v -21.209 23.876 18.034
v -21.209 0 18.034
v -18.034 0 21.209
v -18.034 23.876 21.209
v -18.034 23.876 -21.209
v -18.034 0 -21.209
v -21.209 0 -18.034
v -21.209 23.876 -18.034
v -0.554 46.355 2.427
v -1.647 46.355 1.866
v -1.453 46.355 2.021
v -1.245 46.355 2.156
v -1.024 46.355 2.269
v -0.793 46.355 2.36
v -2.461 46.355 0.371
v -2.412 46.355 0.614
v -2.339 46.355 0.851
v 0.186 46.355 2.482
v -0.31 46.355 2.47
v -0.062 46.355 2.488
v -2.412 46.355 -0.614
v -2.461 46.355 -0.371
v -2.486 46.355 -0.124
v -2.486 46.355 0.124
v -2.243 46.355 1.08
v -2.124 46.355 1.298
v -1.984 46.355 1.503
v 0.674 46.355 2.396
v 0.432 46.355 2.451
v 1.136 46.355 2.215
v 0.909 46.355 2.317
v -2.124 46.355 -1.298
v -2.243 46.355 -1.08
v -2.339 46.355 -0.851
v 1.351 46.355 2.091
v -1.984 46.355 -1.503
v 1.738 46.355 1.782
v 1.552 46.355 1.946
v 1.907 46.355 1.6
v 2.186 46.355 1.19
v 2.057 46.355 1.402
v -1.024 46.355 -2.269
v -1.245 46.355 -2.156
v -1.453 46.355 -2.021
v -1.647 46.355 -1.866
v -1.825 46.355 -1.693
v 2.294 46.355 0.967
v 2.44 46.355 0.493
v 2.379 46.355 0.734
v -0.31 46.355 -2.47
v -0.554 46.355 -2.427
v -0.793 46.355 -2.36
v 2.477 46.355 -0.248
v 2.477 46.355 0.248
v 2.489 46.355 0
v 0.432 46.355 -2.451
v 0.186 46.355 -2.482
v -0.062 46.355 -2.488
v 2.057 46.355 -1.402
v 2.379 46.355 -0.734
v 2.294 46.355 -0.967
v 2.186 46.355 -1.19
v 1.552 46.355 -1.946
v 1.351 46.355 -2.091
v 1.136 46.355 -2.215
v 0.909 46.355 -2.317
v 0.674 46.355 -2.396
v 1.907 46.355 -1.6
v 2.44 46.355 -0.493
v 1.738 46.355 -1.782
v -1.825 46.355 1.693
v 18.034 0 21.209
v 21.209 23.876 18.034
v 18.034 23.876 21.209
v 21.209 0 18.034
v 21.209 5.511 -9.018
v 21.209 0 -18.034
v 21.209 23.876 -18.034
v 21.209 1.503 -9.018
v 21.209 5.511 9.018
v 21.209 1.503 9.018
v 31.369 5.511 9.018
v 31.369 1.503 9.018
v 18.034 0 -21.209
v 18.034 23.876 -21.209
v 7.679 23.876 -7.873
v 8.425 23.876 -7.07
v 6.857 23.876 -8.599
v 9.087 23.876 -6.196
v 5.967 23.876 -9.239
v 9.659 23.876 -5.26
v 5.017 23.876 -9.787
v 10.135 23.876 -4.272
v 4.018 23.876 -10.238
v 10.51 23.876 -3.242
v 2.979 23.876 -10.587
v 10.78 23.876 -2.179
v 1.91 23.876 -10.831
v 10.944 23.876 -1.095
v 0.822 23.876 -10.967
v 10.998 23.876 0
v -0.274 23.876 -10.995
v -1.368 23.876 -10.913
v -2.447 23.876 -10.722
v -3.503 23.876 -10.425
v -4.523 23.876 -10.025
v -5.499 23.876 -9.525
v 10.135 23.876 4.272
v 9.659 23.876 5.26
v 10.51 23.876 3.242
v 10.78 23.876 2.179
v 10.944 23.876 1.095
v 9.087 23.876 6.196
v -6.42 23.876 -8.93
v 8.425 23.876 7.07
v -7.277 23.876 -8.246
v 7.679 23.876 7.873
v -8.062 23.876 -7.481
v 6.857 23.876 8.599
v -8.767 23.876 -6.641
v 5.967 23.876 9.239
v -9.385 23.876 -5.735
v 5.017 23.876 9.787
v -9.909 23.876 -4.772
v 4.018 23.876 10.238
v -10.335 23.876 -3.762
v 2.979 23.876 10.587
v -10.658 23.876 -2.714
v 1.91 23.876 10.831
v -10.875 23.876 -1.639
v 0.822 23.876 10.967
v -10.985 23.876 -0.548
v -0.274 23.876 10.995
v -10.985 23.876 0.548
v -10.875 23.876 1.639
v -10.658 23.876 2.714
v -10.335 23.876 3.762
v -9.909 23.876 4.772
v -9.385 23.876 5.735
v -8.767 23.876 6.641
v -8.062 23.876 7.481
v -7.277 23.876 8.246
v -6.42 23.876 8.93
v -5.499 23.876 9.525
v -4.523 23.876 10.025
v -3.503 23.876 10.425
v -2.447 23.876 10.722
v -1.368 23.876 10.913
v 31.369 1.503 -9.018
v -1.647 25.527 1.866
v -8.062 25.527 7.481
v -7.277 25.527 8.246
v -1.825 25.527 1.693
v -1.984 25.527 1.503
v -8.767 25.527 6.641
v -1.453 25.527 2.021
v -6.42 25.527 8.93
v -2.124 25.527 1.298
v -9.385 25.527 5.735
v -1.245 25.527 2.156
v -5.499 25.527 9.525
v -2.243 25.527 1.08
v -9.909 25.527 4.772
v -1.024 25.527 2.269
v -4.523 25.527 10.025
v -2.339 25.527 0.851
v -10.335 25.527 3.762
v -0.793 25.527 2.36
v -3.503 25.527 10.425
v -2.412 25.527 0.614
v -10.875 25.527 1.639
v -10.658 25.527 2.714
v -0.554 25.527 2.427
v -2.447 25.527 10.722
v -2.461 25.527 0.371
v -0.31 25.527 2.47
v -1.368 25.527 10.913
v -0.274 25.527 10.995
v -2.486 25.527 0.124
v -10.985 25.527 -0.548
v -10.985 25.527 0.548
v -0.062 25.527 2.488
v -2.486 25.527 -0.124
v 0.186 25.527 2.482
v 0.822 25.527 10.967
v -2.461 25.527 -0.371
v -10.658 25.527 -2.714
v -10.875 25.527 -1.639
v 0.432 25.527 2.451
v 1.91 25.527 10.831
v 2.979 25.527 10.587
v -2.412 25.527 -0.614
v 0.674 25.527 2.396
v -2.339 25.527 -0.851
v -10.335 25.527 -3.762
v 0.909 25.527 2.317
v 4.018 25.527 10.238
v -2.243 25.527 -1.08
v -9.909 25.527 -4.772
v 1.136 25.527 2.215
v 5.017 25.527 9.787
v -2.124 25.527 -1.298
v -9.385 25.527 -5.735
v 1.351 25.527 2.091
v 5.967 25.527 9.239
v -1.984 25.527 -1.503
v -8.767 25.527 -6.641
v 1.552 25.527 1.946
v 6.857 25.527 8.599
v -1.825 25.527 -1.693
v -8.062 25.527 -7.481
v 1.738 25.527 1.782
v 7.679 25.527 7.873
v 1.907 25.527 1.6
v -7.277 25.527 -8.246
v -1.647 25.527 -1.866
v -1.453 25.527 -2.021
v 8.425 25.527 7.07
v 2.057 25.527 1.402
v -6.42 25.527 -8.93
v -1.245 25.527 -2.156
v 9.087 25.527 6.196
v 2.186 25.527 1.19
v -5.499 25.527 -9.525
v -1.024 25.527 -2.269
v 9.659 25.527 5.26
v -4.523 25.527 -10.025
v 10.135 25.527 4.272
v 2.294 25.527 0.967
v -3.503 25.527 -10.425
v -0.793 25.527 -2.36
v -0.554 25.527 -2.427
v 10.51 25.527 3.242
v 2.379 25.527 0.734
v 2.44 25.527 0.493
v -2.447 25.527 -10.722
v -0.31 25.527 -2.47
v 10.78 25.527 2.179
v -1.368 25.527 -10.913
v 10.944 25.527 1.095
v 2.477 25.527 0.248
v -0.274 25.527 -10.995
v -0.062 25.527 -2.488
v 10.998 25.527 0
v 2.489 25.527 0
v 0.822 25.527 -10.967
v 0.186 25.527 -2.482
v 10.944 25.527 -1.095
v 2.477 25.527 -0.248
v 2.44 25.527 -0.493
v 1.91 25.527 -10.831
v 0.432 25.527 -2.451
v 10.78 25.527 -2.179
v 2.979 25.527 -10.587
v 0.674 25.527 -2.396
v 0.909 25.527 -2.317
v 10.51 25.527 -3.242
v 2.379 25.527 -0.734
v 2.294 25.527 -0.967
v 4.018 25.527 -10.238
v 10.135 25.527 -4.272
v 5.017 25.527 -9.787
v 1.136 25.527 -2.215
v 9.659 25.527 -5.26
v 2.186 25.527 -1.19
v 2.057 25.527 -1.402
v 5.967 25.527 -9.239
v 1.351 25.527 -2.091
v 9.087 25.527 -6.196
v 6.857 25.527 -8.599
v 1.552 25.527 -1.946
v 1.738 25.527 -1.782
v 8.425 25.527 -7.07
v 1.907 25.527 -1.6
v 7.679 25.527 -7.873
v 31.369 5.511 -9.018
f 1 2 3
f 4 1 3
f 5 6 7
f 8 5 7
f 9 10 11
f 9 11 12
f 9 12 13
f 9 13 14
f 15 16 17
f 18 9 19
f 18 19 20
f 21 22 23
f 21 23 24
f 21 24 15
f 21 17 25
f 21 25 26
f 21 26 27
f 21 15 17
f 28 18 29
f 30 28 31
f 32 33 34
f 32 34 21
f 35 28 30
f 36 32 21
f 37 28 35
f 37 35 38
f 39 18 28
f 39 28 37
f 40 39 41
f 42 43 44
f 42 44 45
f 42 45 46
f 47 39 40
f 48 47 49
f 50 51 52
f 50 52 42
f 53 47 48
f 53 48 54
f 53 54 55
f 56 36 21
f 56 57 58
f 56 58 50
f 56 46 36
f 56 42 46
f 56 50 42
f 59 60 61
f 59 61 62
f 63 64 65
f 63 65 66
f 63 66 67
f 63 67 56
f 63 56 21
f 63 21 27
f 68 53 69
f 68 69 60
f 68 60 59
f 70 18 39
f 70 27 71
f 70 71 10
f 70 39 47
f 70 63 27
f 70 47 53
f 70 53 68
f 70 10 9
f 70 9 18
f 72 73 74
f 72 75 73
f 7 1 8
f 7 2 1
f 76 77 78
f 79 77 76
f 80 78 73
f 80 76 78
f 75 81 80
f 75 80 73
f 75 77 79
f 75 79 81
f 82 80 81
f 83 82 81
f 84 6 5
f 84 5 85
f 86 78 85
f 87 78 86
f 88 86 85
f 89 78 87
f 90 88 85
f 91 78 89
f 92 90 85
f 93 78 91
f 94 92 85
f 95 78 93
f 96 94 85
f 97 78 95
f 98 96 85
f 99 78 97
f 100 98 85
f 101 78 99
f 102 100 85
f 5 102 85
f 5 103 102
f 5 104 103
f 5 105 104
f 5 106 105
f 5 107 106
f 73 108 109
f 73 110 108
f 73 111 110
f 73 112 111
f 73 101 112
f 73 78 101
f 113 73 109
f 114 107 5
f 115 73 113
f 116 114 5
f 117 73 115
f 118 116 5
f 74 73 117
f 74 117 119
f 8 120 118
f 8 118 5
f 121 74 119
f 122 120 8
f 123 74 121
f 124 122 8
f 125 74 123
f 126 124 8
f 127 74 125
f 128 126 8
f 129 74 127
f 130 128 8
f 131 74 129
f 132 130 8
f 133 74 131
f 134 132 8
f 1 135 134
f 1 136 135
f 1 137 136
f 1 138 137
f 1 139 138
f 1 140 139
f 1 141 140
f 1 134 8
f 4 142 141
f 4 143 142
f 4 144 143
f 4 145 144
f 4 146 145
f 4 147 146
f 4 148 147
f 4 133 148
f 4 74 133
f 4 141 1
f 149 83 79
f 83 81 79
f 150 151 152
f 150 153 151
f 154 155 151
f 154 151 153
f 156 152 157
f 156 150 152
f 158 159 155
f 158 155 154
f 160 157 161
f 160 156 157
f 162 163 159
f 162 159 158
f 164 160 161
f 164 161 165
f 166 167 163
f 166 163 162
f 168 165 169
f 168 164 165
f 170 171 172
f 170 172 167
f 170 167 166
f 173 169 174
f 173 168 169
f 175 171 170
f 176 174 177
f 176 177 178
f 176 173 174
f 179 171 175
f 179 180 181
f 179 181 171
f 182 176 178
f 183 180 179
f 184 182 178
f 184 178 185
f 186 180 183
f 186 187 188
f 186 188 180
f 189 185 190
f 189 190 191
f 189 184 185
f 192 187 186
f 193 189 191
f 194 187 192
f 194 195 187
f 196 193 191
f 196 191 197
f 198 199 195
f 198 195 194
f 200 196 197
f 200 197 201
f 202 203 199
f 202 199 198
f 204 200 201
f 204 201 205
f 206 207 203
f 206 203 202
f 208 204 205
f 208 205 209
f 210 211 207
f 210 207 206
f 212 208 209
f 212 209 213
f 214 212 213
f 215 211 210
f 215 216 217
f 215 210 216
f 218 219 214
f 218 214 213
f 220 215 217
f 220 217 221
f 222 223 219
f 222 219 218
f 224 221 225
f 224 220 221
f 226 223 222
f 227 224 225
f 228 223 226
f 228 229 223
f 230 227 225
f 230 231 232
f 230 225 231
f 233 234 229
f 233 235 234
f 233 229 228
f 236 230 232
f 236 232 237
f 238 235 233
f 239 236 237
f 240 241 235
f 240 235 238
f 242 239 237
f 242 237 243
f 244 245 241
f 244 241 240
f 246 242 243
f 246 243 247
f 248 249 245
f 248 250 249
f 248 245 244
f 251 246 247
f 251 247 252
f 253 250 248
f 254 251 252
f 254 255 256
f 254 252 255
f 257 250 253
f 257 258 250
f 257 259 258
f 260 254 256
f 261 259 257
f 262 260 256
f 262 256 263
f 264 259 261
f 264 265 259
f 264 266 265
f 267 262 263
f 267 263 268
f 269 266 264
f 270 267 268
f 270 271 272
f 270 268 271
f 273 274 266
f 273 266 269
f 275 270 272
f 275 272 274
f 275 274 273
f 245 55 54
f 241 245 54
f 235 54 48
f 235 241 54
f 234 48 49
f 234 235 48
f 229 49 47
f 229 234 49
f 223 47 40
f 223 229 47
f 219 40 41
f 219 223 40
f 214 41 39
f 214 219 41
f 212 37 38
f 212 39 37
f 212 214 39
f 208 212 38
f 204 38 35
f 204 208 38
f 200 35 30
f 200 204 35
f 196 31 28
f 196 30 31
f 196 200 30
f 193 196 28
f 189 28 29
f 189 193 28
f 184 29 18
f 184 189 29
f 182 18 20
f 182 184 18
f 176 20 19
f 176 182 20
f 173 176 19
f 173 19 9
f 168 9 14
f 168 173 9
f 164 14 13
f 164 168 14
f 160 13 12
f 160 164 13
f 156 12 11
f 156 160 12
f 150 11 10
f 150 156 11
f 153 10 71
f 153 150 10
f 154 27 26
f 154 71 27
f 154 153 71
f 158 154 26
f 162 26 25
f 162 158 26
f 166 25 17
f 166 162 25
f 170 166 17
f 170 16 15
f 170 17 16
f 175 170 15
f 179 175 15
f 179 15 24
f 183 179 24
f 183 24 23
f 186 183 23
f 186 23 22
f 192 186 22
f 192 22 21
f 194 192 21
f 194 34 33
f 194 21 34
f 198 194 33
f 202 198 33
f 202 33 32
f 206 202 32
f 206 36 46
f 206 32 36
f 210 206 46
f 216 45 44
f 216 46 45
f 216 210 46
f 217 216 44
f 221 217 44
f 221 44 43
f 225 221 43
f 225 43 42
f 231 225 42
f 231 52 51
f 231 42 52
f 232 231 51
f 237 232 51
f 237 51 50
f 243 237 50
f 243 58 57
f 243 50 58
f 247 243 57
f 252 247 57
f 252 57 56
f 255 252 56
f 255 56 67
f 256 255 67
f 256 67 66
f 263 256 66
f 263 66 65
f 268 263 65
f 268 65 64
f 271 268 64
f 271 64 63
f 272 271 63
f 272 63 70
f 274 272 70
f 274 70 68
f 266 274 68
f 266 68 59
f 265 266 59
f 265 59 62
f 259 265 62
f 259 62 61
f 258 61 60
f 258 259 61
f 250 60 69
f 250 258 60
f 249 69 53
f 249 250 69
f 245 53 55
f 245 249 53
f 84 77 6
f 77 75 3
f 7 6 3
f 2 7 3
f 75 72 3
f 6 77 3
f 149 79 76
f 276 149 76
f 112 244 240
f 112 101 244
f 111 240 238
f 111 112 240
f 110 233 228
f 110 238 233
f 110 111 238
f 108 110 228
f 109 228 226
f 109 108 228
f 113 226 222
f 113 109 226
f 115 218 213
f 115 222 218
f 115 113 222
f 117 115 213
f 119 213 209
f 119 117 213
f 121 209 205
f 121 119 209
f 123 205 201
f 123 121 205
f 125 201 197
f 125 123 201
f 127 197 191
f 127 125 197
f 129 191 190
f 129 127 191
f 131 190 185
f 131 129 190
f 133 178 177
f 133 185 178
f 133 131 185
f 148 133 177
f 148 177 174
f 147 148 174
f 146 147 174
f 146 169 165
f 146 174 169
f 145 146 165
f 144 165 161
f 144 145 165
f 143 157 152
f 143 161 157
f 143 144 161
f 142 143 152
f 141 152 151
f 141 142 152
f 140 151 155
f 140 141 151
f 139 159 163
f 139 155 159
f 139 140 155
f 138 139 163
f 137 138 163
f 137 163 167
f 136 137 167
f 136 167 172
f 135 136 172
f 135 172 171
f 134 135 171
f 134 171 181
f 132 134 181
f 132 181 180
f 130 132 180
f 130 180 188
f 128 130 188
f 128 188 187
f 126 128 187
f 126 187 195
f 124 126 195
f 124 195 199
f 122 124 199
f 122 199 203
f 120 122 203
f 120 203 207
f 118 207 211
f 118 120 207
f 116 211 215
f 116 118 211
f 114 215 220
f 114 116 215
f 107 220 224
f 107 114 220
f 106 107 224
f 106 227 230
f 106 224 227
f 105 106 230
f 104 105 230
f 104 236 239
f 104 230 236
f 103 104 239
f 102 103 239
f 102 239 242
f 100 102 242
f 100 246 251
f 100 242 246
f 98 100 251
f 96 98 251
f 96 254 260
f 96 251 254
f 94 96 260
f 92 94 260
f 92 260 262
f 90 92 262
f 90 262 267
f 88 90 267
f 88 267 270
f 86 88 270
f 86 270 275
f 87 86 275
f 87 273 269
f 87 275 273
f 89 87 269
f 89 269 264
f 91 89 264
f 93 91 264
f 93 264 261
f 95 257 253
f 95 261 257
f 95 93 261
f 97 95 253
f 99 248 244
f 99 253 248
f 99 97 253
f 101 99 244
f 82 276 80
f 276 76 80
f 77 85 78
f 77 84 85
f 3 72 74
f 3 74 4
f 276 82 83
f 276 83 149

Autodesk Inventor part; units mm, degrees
ref_plane "YZ Plane" through (0, 0, 0) normal (1, 0, 0) x (0, 1, 0)
ref_plane "XZ Plane" through (0, 0, 0) normal (0, 1, 0) x (-1, 0, 0)
ref_plane "XY Plane" through (0, 0, 0) normal (0, 0, 1) x (1, 0, 0)
sketch "Sketch1" plane through (0, 0, 0) normal (0, 1, 0) x (-1, 0, 0)
  line L0 (-18.034, 21.209) -> (18.034, 21.209)
  line L1 (21.209, 18.034) -> (21.209, -18.034)
  line L2 (18.034, -21.209) -> (-18.034, -21.209)
  line L3 (-21.209, -18.034) -> (-21.209, 18.034)
  line L4 (-21.209, 21.209) -> (21.209, -21.209) construction
  line L5 (21.209, 21.209) -> (-21.209, -21.209) construction
  line L6 (21.209, 18.034) -> (18.034, 21.209)
  line L7 (18.034, -21.209) -> (21.209, -18.034)
  line L8 (-18.034, -21.209) -> (-21.209, -18.034)
  line L9 (-21.209, 18.034) -> (-18.034, 21.209)
  point P0 (0, 0)
  dimension "d0" = 42.418
  dimension "d1" = 3.175
  dimension "d2" = 3.175
  dimension "d3" = 3.175
  dimension "d4" = 3.175
  dimension "d5" = 3.175
  dimension "d6" = 3.175
  dimension "d7" = 3.175
  dimension "d8" = 3.175
extrude "Extrusion1" add sketch "Sketch1" along normal blind 23.876
sketch "Sketch2" plane through (0, 23.876, 0) normal (0, 1, 0) x (1, 0, 0)
  circle A0 centre (0, 0) radius 10.9982
  dimension "d11" = 21.9964
extrude "Extrusion2" add sketch "Sketch2" along normal blind 1.651
sketch "Sketch3" plane through (0, 25.527, 0) normal (0, 1, 0) x (1, 0, 0)
  circle A0 centre (0, 0) radius 2.4892
  dimension "d14" = 4.9784
extrude "Extrusion3" add sketch "Sketch3" along normal blind 20.828
sketch "Sketch4" plane through (21.209, 0, 18.034) normal (1, 0, 0) x (0, 0, -1)
  line L0 (9.0162, 1.503) -> (27.0518, 1.503)
  line L1 (27.0518, 1.503) -> (27.0518, 5.5109)
  line L2 (27.0518, 5.5109) -> (9.0162, 5.5109)
  line L3 (9.0162, 5.5109) -> (9.0162, 1.503)
  line L4 (9.0162, 1.503) -> (27.0518, 5.5109) construction
  line L5 (27.0518, 1.503) -> (9.0162, 5.5109) construction
  point P0 (18.034, 0)
  point P1 (18.034, 3.5069)
extrude "Extrusion4" add sketch "Sketch4" along normal blind 10.16
equation "\"d2\" = d1"
equation "\"d3\" = d1"
equation "\"d4\" = d3"
equation "\"d5\" = d1"
equation "\"d6\" = d5"
equation "\"d7\" = d1"
equation "\"d8\" = d7"
properties part number "stepper_17HS4023"
